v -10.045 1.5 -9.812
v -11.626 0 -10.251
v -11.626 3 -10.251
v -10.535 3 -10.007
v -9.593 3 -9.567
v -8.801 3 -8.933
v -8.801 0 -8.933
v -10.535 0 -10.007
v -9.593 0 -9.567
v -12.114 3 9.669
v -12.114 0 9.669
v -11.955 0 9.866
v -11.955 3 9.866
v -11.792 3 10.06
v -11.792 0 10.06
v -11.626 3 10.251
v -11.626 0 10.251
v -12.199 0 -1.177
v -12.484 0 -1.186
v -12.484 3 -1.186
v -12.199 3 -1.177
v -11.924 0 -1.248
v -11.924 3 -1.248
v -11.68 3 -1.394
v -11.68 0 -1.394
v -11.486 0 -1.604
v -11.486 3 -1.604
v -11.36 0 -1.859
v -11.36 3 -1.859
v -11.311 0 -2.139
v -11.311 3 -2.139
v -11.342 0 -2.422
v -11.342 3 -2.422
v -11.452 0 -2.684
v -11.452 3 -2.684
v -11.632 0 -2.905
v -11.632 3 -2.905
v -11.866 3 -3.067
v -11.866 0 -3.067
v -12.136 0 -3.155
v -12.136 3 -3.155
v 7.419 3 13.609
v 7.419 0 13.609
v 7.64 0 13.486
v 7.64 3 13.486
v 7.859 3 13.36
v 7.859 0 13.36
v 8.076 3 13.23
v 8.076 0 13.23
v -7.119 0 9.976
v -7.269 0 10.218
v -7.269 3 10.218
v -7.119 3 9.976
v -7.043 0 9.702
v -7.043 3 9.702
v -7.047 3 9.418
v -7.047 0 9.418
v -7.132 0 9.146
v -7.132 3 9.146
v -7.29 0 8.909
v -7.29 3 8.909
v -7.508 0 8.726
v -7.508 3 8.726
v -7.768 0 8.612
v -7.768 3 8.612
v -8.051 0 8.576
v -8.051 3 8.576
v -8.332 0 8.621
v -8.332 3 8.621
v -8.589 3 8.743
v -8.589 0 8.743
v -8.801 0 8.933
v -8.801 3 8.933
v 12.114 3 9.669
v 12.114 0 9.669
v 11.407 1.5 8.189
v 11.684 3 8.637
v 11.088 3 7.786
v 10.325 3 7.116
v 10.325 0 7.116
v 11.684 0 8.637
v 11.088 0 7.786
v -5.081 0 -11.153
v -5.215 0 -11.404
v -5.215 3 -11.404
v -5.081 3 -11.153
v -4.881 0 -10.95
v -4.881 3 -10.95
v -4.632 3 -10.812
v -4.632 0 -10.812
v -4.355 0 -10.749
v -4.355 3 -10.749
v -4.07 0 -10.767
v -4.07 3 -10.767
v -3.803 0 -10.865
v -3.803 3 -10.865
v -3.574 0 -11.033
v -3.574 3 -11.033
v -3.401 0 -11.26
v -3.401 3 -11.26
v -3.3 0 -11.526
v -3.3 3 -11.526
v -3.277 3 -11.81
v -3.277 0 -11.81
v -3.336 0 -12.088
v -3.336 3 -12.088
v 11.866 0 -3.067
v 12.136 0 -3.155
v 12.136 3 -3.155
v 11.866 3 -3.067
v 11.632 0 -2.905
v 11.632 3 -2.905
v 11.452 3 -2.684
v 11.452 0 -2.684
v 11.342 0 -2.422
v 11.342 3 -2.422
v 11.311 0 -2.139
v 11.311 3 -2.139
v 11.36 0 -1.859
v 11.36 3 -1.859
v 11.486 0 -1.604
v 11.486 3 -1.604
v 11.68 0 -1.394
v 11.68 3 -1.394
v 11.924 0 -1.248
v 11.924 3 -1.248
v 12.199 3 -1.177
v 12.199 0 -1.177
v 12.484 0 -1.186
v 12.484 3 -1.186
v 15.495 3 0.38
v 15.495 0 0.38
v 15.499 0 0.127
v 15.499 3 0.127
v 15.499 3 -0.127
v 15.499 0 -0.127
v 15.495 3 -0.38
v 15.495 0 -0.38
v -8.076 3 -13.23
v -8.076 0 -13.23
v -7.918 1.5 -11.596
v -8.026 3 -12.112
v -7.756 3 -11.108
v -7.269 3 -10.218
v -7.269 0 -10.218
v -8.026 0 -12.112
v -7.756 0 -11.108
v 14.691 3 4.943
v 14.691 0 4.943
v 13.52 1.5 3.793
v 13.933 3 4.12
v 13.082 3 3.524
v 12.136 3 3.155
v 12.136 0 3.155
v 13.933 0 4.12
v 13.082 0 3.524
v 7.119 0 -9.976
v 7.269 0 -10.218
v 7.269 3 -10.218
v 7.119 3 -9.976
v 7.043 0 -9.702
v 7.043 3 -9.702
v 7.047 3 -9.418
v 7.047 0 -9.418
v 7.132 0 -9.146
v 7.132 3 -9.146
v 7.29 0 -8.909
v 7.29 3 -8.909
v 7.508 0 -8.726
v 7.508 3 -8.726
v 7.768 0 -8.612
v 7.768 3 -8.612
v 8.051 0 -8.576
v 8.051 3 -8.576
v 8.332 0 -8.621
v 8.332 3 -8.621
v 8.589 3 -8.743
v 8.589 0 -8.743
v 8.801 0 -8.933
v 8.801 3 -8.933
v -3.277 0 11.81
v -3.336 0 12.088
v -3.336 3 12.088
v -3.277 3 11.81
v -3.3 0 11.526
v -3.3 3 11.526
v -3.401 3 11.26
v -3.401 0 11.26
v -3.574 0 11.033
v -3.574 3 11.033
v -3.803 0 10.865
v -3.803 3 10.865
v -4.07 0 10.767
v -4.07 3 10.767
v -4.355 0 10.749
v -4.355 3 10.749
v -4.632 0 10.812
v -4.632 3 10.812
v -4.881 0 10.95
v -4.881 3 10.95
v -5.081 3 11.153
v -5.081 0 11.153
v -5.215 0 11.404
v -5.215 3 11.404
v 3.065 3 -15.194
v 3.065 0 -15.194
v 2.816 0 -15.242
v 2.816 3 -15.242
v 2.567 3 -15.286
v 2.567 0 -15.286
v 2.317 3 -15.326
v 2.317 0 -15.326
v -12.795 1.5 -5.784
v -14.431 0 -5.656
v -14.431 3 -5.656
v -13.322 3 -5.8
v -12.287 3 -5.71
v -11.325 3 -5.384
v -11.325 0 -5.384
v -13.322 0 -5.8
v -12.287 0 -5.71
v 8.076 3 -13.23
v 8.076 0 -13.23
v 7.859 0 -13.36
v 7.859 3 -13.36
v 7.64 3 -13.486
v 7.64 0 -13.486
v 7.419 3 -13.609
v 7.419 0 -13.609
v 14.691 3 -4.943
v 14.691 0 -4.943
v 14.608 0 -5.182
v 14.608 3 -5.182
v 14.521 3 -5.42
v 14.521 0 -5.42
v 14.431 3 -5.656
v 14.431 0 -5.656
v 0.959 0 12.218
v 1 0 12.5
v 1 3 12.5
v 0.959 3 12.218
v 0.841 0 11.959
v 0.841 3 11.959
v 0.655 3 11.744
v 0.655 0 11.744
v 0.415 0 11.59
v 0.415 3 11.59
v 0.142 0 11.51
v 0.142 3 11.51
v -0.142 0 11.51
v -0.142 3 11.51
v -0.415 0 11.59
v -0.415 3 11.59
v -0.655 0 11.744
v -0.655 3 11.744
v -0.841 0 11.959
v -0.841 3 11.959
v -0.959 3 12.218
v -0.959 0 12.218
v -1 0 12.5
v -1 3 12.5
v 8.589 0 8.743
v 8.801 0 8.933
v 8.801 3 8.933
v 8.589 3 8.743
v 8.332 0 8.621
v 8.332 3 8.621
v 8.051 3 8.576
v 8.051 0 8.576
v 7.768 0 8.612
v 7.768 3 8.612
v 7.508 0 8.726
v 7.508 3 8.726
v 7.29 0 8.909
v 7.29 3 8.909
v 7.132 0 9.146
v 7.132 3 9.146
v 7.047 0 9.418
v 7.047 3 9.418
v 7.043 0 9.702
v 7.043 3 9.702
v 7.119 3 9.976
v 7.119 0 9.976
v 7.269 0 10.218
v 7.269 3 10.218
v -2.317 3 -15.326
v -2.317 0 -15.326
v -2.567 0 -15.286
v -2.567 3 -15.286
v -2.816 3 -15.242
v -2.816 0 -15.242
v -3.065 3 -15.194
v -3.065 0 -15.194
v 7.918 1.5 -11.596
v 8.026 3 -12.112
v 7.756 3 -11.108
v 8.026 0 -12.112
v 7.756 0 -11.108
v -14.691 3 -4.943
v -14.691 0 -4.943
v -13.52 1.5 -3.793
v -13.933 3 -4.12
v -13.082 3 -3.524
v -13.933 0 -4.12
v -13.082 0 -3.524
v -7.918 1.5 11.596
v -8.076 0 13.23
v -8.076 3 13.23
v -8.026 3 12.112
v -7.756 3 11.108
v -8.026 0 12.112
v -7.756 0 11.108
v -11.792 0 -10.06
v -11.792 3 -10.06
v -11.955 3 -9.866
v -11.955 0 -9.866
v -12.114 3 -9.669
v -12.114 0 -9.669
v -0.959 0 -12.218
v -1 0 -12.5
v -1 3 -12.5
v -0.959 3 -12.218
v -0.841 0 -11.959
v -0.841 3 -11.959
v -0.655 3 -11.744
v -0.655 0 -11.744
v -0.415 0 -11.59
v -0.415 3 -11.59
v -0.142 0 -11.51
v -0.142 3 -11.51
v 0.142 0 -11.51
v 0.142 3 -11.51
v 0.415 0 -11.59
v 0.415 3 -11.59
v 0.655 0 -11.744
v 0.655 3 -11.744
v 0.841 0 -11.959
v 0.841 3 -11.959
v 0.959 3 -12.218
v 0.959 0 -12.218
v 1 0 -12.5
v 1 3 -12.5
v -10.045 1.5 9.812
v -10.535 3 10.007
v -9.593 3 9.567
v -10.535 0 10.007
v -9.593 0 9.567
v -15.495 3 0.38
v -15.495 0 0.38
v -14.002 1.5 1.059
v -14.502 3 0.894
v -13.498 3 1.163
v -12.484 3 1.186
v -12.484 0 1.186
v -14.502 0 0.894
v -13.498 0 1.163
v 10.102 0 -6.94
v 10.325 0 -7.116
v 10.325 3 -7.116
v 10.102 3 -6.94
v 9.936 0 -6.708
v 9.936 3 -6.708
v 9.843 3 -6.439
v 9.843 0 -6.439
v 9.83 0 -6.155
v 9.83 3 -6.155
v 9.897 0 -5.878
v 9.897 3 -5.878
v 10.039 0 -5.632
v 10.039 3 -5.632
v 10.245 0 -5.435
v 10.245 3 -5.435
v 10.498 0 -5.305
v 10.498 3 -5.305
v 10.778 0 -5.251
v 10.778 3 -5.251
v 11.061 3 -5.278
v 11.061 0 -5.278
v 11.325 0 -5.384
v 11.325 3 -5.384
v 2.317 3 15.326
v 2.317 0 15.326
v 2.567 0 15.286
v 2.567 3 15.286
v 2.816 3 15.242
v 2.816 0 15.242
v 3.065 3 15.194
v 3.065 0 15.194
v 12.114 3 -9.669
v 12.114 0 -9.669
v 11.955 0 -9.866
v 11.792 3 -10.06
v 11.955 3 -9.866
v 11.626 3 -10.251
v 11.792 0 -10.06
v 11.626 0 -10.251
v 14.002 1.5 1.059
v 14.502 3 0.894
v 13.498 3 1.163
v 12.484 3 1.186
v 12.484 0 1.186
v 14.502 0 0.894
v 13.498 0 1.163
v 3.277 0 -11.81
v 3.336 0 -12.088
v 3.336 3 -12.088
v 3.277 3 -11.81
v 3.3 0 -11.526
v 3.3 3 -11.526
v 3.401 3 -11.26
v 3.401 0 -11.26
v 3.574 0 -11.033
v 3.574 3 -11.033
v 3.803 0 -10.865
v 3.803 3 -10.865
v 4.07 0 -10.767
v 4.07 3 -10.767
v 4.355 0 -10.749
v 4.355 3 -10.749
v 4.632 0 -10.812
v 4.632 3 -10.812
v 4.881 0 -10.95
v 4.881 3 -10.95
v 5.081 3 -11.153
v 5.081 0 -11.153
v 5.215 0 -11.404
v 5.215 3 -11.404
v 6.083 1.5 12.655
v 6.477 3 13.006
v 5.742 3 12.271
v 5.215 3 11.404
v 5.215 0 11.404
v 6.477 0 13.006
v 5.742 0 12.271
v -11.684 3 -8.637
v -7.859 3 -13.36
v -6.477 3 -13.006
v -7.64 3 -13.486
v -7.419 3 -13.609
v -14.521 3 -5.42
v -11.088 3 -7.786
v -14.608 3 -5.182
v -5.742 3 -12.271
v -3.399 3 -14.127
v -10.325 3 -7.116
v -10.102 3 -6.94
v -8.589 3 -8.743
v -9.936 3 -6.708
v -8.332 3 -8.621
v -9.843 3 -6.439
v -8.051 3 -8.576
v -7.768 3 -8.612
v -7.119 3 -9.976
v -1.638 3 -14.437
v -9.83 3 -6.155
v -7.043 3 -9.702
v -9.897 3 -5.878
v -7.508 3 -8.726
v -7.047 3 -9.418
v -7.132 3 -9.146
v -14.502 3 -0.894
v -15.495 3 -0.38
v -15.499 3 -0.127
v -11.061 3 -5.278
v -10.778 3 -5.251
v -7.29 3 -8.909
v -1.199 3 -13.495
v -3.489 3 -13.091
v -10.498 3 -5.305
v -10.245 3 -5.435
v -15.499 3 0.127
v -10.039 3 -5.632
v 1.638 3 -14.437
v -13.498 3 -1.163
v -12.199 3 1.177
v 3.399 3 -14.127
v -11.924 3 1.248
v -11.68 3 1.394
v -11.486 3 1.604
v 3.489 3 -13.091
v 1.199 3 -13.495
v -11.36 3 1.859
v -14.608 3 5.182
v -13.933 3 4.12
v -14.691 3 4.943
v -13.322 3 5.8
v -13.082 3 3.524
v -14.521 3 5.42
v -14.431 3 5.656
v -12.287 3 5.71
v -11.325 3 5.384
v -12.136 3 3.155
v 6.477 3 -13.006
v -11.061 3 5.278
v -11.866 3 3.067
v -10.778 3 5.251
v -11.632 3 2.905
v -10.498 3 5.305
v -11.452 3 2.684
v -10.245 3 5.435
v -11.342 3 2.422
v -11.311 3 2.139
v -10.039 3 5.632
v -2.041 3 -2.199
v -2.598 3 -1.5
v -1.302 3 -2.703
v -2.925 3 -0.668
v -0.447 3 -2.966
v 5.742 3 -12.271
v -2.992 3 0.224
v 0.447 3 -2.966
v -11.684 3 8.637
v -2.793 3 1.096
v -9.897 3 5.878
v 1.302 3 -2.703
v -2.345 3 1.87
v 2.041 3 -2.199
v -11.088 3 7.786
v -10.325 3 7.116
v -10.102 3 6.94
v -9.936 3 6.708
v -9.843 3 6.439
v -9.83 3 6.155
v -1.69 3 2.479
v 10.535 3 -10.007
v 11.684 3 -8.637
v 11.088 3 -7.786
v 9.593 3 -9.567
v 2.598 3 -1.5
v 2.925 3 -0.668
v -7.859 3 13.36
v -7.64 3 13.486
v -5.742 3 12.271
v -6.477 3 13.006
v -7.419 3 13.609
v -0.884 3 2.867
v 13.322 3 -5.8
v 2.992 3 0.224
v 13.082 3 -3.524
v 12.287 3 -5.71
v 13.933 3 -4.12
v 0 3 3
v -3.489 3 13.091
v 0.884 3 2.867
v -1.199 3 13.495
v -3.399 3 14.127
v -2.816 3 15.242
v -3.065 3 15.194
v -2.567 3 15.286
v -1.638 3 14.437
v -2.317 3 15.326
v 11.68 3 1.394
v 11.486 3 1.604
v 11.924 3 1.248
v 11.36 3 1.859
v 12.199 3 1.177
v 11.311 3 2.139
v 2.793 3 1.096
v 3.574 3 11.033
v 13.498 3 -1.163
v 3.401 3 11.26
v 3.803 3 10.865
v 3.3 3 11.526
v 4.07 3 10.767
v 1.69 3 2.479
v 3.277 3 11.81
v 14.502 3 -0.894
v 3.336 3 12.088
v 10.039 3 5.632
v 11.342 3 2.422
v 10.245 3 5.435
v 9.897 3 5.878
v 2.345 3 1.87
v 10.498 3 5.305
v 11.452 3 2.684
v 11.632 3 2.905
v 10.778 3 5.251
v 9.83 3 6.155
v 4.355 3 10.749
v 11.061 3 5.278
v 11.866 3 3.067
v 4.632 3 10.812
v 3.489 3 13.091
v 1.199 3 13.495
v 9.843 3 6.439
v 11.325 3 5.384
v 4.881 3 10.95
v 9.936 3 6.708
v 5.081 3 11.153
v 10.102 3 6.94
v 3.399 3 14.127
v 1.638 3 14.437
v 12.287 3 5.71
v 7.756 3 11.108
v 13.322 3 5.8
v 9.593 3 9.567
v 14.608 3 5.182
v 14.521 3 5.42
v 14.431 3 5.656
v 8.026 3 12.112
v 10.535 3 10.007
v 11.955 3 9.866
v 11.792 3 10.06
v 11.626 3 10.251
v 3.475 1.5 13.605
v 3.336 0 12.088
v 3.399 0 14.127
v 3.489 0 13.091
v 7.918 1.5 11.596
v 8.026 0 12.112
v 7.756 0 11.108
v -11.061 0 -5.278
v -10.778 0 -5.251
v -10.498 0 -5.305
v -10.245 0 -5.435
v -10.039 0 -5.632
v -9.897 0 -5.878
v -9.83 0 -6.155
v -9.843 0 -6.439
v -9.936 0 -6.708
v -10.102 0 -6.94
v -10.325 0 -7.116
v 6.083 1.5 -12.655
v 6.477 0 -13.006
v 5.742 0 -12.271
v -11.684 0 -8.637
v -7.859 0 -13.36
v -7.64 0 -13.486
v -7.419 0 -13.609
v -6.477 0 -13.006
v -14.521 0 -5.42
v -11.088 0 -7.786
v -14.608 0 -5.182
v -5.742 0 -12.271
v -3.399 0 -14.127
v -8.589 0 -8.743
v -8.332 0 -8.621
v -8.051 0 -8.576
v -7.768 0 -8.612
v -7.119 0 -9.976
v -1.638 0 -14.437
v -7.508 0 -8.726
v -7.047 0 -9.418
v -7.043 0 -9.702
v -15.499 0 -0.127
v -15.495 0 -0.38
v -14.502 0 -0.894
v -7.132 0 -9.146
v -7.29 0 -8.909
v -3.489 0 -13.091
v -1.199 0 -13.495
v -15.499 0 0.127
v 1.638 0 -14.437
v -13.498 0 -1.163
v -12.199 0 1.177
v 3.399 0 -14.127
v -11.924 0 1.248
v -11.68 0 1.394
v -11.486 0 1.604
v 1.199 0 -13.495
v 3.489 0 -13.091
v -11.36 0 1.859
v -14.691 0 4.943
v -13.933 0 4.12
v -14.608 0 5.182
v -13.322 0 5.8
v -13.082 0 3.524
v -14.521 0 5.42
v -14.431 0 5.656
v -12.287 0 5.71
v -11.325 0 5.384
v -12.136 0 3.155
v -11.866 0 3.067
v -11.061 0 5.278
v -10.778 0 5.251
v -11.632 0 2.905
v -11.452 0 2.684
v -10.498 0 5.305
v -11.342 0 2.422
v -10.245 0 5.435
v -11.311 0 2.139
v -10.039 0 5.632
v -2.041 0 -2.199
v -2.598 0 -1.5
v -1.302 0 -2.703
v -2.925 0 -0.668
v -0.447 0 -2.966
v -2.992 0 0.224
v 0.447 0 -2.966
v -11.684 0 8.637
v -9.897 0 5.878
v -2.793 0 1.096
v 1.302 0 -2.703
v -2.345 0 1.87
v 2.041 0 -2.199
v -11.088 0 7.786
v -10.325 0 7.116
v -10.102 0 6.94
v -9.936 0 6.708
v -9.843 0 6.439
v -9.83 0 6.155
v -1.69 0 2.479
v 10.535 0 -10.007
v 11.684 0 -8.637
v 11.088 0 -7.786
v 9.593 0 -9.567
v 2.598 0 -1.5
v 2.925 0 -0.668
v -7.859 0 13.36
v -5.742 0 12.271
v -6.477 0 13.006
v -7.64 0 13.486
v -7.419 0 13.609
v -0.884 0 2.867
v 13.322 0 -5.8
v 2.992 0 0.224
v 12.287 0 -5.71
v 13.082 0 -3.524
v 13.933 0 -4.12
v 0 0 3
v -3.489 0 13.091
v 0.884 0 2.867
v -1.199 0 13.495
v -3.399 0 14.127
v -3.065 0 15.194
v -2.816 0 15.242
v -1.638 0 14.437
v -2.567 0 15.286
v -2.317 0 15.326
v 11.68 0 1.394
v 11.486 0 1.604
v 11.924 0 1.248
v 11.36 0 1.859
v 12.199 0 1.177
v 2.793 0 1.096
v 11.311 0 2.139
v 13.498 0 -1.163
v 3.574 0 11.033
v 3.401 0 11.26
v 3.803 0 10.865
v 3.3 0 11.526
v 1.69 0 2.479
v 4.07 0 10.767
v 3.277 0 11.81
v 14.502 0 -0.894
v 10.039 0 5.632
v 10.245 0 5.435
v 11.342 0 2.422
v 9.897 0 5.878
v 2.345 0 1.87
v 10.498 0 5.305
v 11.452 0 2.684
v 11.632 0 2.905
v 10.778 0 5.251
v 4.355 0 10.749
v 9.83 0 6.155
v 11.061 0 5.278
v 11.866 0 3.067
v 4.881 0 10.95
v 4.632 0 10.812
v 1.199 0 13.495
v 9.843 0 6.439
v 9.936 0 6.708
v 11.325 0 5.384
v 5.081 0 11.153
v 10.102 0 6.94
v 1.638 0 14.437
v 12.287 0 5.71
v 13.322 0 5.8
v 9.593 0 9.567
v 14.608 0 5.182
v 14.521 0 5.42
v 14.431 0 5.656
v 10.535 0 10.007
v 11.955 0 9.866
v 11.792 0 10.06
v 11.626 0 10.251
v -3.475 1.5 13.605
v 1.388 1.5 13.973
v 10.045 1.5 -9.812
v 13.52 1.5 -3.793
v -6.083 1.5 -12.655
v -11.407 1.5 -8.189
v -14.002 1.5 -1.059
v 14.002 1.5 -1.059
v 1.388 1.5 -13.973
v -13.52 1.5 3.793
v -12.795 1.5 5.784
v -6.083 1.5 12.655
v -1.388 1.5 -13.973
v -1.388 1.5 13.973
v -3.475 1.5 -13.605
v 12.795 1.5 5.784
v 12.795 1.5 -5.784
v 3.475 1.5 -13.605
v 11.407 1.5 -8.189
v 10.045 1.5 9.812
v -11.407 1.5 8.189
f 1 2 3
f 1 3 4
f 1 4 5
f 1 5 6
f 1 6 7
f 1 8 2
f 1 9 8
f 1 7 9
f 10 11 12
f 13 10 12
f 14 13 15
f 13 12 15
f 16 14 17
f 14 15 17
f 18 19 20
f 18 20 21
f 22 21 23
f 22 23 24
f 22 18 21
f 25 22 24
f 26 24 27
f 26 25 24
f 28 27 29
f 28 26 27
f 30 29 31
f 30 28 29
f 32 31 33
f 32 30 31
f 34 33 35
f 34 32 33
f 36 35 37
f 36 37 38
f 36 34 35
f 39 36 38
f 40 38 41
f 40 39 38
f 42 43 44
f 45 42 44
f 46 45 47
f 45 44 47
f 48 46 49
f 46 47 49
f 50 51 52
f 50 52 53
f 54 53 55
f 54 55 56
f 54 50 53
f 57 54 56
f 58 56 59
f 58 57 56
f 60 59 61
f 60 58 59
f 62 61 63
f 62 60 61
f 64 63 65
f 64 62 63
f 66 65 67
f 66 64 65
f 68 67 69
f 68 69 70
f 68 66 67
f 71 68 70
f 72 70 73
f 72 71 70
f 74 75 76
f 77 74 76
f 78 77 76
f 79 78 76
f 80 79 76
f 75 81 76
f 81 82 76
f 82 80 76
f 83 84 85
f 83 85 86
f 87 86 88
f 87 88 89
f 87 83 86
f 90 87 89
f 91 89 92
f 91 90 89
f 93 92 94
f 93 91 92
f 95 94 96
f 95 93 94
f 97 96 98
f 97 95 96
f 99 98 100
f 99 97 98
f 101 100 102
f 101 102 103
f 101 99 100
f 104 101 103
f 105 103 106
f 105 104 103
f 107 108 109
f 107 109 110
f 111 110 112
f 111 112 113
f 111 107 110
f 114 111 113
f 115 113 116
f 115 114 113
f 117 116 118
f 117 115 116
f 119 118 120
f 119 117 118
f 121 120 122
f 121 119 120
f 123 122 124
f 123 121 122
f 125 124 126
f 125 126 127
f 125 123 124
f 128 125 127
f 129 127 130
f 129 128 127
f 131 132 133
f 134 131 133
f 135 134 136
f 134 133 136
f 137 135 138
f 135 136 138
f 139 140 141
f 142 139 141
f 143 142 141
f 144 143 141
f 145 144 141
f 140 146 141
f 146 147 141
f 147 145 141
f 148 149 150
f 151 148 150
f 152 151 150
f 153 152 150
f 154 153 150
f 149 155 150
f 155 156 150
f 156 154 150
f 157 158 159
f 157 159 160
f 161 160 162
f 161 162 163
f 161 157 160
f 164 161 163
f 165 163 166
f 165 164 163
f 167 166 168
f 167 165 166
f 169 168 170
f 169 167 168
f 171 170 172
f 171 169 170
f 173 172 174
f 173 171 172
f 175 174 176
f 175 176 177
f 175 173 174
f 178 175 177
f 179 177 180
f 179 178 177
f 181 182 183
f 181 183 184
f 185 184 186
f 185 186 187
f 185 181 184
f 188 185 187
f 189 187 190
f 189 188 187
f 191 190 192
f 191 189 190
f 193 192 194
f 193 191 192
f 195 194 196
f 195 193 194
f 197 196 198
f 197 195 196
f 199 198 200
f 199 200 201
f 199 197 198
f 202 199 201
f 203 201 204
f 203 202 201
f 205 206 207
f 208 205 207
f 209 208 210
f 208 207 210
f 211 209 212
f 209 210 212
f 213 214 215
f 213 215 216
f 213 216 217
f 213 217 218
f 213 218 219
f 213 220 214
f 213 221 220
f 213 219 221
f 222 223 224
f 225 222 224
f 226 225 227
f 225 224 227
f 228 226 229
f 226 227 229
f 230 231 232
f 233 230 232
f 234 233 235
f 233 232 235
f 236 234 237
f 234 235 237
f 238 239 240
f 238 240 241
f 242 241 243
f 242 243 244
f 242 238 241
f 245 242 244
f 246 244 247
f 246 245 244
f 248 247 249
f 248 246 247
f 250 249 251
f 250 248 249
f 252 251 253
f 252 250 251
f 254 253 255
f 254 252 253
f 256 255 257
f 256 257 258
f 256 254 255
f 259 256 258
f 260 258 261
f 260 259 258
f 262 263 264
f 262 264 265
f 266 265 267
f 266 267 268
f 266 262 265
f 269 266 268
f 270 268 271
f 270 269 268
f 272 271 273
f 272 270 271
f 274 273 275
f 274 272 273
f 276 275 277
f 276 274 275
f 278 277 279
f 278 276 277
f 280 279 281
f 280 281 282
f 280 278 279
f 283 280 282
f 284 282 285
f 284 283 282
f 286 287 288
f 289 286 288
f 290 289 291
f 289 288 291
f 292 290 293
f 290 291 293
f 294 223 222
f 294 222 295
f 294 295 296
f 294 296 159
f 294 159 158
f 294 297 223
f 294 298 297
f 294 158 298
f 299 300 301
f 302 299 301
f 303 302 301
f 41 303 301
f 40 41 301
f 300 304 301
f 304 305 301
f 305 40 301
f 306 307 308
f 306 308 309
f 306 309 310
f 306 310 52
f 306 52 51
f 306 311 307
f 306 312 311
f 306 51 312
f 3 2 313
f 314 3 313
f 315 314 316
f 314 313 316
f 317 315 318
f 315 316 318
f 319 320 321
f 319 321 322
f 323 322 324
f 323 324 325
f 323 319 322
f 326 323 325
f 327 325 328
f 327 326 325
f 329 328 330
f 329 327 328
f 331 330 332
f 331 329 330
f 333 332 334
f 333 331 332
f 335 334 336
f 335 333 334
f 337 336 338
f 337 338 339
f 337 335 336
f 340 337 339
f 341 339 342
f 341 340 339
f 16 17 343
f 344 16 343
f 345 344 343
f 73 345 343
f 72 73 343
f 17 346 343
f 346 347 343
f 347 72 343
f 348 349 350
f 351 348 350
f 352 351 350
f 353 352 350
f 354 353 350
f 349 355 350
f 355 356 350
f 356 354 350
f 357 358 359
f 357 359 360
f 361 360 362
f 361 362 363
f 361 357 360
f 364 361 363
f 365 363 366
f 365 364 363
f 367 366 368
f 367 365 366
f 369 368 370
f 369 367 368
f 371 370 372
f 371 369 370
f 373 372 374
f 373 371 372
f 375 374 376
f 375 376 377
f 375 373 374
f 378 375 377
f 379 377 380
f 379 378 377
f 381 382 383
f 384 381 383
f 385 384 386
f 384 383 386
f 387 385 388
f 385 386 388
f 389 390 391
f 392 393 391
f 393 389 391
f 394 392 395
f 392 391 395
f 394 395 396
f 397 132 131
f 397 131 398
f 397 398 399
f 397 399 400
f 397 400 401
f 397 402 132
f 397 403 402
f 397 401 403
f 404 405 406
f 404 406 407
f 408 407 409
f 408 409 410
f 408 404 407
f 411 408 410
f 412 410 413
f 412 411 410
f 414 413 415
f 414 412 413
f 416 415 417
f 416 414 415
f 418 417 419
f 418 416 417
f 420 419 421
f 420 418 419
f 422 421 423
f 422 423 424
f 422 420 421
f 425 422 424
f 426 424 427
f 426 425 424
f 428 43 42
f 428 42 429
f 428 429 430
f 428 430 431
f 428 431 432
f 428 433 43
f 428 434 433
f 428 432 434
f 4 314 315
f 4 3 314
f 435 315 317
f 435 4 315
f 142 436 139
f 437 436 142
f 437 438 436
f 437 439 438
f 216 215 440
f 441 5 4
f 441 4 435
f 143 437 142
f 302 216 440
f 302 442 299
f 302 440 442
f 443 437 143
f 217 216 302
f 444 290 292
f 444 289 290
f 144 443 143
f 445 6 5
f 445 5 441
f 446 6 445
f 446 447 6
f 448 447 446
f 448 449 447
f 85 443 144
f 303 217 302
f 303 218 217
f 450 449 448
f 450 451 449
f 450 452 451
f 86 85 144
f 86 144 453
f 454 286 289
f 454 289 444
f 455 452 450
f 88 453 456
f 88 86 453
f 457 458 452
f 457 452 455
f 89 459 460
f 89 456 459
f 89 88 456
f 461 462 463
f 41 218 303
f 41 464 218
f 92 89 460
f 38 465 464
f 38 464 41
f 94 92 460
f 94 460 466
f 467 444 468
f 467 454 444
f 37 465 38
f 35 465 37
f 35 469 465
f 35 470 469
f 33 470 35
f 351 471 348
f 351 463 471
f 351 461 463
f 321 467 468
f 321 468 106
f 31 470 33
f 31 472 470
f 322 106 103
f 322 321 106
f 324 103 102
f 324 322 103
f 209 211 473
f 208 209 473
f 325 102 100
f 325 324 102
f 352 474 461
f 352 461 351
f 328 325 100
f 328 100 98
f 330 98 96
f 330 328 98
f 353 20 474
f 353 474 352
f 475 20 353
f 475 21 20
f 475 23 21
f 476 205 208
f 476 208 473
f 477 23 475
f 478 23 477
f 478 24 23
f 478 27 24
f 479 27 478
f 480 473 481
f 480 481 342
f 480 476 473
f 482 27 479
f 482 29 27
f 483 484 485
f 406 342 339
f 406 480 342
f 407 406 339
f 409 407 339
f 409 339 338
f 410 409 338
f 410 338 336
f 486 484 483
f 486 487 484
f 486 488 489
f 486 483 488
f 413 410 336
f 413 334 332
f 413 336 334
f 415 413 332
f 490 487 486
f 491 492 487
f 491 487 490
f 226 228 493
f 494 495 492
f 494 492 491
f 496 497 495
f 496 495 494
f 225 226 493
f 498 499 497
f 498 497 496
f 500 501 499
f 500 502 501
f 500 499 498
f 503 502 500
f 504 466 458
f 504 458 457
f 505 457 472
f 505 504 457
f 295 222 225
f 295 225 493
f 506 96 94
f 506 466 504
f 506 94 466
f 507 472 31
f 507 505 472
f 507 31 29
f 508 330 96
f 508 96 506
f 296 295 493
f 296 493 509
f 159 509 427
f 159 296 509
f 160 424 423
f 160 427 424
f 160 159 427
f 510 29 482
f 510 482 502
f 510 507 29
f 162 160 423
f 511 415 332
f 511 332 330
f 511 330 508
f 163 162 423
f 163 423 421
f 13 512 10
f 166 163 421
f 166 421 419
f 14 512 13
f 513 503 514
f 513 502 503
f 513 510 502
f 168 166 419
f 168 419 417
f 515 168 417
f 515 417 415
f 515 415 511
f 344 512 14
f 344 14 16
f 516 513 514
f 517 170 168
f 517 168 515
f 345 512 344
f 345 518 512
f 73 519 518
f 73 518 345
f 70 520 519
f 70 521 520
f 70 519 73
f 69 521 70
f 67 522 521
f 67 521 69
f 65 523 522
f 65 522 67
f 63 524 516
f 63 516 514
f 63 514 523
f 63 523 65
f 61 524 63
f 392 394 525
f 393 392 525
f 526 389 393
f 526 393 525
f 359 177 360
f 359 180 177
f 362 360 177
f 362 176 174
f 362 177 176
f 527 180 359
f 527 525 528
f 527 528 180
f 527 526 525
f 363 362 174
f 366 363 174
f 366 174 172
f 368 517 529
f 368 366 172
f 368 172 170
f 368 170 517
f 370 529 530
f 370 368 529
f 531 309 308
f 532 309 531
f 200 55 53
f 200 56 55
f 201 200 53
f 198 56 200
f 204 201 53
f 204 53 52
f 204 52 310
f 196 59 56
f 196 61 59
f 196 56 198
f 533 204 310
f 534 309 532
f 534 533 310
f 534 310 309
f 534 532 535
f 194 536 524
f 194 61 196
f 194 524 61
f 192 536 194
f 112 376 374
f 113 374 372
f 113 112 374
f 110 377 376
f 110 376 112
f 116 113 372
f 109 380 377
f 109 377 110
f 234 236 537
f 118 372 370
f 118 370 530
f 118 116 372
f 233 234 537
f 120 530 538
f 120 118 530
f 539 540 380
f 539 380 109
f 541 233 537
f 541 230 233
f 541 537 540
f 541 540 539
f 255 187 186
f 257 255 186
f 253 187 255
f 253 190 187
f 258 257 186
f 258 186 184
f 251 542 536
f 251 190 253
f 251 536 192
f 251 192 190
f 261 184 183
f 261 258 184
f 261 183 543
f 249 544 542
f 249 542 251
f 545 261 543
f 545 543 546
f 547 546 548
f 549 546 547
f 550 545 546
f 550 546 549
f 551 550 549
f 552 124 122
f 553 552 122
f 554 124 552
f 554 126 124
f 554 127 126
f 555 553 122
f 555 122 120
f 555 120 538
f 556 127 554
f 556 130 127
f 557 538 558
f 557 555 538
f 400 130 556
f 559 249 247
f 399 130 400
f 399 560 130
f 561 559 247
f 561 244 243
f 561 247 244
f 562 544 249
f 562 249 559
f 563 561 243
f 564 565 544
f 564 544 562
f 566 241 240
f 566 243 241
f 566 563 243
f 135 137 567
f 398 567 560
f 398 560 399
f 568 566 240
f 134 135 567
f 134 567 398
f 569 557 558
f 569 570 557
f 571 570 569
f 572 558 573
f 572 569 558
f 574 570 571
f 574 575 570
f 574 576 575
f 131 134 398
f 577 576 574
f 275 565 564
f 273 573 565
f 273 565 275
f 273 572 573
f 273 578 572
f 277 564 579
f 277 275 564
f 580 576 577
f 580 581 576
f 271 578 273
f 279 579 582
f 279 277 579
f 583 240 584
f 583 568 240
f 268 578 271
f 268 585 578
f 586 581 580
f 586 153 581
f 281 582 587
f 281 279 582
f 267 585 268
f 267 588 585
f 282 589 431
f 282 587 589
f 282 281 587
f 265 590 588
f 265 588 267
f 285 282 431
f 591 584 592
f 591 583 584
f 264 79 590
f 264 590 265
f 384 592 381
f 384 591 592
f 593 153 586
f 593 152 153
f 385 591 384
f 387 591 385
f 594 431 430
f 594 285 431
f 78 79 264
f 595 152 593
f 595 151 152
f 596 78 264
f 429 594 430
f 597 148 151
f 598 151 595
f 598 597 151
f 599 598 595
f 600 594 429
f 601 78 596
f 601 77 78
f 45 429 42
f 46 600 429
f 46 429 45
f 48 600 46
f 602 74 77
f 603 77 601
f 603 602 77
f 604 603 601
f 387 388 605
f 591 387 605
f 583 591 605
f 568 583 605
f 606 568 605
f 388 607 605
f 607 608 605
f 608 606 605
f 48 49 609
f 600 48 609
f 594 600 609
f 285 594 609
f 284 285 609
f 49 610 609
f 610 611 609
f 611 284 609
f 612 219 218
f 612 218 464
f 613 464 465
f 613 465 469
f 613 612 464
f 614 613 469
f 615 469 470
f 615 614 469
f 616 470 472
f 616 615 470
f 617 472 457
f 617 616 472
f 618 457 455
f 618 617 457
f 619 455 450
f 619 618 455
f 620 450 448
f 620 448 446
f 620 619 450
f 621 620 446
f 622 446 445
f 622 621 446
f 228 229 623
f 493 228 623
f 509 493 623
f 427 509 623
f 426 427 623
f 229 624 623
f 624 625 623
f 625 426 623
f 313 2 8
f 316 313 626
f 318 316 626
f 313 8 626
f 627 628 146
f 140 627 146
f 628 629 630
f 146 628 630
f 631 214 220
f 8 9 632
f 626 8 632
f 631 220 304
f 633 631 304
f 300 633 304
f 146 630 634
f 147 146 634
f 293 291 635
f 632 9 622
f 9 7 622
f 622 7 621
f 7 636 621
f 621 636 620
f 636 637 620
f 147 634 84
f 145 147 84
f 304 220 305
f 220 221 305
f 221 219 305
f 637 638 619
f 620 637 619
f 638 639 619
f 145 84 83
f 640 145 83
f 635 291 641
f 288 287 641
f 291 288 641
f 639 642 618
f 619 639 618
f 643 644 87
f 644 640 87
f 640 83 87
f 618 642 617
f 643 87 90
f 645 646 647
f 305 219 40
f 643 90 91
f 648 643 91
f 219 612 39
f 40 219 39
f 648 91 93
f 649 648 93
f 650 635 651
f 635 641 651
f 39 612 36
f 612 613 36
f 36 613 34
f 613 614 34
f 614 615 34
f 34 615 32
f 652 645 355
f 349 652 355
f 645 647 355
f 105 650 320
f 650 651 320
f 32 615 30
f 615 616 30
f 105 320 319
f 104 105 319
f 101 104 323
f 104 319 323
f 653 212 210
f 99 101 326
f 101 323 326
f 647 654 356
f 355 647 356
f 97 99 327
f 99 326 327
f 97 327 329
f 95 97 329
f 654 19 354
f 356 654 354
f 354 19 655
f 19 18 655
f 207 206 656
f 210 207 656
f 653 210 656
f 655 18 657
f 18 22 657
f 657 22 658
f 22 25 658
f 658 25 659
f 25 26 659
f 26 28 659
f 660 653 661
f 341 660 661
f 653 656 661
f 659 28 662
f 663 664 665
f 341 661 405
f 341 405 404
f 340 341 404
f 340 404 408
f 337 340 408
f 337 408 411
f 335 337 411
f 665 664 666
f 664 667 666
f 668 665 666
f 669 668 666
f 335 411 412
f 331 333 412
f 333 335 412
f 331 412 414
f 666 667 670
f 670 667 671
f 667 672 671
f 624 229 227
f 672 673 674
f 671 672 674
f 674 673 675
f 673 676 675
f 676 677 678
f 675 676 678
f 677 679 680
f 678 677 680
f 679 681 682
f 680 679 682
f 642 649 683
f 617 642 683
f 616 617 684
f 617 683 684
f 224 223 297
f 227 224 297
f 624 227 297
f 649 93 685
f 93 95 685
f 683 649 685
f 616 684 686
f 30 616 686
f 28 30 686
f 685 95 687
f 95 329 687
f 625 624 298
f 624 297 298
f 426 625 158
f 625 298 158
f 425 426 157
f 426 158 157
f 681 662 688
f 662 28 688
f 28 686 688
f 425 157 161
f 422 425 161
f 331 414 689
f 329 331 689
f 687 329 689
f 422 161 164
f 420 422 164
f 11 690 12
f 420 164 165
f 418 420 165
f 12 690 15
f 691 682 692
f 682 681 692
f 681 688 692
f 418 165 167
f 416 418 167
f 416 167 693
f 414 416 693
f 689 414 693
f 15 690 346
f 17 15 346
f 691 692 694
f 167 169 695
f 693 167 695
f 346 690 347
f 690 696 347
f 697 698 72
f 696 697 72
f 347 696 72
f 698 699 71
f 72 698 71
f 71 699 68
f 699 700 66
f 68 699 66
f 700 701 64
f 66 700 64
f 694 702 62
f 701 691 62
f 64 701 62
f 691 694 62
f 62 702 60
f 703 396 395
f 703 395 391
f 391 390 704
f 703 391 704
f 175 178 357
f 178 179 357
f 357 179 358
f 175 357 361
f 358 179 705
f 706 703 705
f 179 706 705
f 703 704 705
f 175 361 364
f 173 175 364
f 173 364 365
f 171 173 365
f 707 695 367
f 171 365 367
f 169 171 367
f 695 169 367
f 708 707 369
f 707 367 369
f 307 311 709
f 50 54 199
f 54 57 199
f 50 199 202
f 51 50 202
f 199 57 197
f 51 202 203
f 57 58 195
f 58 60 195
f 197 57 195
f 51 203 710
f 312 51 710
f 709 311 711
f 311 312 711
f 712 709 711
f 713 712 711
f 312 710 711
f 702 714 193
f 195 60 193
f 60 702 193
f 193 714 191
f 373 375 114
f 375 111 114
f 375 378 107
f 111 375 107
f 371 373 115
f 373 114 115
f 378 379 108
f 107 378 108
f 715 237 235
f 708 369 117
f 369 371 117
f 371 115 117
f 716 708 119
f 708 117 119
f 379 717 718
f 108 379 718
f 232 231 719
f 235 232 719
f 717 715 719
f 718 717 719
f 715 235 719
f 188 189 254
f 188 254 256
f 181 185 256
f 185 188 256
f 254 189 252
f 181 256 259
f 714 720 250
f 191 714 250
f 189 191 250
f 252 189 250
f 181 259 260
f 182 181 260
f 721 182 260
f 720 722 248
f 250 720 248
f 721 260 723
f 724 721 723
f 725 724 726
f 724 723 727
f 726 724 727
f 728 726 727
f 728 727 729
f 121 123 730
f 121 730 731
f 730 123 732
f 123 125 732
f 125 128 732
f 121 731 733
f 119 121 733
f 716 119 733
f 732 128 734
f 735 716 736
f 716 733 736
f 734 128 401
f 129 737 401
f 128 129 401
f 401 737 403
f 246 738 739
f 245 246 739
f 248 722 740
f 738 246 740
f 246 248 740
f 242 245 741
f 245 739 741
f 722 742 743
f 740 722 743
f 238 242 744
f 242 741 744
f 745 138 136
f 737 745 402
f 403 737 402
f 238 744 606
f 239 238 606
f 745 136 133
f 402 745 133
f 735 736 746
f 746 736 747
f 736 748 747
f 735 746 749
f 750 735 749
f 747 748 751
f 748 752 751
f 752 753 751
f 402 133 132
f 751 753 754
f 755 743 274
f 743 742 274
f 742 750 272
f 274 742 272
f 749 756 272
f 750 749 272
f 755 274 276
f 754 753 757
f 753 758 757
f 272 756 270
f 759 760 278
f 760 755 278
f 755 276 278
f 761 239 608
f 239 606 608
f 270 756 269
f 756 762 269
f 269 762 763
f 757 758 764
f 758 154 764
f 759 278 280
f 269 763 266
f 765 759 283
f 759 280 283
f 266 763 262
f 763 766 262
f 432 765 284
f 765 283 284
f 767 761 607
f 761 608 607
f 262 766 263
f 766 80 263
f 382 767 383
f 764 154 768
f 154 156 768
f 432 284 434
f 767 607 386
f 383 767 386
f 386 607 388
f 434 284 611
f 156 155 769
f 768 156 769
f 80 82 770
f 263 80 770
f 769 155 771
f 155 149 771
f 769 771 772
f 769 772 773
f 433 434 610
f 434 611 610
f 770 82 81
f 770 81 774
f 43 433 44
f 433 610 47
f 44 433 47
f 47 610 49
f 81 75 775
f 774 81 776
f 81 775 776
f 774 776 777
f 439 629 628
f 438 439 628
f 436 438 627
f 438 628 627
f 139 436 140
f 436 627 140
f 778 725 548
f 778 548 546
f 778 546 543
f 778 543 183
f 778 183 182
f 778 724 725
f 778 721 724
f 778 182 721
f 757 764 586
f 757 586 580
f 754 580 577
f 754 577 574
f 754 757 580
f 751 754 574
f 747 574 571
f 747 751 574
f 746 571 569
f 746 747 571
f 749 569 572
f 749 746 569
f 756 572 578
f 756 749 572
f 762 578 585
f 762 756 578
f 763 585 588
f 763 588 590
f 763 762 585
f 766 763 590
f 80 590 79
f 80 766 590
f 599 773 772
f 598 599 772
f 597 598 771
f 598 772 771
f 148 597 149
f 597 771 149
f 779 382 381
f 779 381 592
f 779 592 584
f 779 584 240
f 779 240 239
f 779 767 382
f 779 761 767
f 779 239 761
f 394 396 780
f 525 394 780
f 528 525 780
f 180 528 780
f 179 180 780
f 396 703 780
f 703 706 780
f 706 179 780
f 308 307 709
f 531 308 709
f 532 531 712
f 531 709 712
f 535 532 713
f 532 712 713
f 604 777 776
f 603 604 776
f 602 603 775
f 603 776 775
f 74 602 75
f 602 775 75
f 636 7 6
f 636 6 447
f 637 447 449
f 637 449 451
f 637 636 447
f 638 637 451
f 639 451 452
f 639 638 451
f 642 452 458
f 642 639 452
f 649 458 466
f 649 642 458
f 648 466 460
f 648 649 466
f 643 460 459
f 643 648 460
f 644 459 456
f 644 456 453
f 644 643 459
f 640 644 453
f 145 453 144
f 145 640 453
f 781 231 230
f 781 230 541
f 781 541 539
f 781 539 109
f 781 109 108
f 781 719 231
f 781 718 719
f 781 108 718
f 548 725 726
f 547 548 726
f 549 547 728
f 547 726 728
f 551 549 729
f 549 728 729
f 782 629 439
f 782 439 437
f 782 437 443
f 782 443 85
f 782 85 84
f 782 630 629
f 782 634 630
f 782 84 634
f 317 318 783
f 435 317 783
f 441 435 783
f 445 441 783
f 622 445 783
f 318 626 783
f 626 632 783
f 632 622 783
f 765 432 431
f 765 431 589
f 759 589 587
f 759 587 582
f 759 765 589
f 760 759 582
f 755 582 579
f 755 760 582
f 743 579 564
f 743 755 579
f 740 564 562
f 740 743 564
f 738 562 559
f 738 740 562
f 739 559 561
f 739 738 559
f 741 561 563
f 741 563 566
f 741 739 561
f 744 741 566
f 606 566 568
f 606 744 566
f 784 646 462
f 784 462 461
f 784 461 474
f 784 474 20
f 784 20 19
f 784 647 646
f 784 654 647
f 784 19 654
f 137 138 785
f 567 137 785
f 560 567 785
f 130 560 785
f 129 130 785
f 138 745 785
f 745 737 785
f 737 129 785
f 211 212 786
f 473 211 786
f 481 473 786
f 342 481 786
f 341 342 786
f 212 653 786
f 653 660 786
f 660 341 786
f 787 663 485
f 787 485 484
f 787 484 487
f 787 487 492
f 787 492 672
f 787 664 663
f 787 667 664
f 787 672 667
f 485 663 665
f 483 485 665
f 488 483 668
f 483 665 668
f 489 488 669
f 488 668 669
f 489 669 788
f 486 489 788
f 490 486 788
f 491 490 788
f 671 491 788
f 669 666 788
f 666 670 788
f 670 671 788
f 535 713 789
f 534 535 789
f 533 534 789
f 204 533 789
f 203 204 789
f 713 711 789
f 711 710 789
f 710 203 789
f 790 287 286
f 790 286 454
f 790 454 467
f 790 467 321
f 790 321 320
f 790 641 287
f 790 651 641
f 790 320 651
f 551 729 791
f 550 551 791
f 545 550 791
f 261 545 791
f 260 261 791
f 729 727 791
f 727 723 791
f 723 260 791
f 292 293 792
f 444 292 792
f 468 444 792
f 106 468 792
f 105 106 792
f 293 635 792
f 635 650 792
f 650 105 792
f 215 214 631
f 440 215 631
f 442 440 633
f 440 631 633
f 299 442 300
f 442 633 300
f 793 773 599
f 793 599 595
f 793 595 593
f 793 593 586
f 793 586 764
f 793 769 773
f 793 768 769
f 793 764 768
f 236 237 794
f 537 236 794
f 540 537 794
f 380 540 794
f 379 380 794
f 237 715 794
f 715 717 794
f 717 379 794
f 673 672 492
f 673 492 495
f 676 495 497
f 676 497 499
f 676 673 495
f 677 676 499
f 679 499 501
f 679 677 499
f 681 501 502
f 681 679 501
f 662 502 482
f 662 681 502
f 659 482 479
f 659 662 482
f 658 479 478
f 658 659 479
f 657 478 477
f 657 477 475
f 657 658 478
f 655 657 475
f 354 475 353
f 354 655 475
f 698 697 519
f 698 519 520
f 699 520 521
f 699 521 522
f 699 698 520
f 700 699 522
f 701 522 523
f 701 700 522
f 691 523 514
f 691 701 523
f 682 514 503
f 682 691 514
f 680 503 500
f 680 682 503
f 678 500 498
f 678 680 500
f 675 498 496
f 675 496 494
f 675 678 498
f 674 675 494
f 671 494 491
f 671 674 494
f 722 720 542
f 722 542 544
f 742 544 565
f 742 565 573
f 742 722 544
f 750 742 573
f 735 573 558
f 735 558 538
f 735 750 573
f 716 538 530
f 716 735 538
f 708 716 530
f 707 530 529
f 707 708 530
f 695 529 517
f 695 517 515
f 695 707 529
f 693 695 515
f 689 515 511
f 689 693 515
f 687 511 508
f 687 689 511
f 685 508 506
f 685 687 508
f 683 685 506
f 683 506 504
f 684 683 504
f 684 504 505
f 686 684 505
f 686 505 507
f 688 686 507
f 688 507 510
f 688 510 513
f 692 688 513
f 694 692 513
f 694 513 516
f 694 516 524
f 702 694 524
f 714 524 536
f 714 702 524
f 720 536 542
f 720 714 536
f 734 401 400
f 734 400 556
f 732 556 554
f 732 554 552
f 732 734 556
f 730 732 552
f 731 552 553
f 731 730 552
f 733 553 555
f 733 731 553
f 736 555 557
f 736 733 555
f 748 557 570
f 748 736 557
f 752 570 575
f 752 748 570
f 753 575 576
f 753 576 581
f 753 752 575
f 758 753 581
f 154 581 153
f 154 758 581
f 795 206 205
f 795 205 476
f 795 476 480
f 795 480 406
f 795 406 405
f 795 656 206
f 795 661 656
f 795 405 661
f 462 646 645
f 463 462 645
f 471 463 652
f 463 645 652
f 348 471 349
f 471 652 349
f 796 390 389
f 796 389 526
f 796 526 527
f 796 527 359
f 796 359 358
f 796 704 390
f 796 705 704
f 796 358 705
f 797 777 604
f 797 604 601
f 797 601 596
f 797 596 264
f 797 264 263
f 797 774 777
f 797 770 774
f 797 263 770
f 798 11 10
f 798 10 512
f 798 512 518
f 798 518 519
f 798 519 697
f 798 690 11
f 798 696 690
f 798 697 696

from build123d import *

# Parameters (mm, degrees)
SKETCH1_R           = 15.5
SKETCH1_R_2         = 3
BOSS_EXTRUDE1_DEPTH = 3
CUT_EXTRUDE3_START  = -3
CUT_EXTRUDE3_DEPTH  = 3
CIRPATTERN2_COUNT   = 18


with BuildPart() as part:
    # Sketch1 → Boss-Extrude1 (new body)
    with BuildSketch(Plane(origin=(0, 0, 0), x_dir=(1, 0, 0), z_dir=(0, 1, 0))):
        with Locations(Location((0, 0, 0), (0, 0, 270))):
            Circle(SKETCH1_R)
        with Locations(Location((0, 0, 0), (0, 0, 270))):
            Circle(SKETCH1_R_2, mode=Mode.SUBTRACT)
    extrude(amount=BOSS_EXTRUDE1_DEPTH)

    # Sketch3 → Cut-Extrude3 (cut)
    with BuildSketch(Plane(origin=(0, 3, 0), x_dir=(1, 0, 0), z_dir=(0, 1, 0)).offset(CUT_EXTRUDE3_START)):
        with BuildLine():
            ThreePointArc((-1, 12.5), (0, 11.5), (1, 12.5))
            add(Edge.make_bspline(
                [(2.316977637, 15.325847925), (1.117647531, 14.032764815), (1, 12.5)],
                knots=[0, 0, 0, 0.821337086, 0.821337086, 0.821337086], degree=2))
            ThreePointArc((2.316977637, 15.325847925), (0, 15.5), (-2.316977637, 15.325847925))
            add(Edge.make_bspline(
                [(-2.316977637, 15.325847925), (-1.117647531, 14.032764815), (-1, 12.5)],
                knots=[0, 0, 0, 0.821337086, 0.821337086, 0.821337086], degree=2))
        make_face()
    cut_extrude3 = extrude(amount=CUT_EXTRUDE3_DEPTH, mode=Mode.SUBTRACT)

    # CirPattern2: Cut-Extrude3 ×18 about axis
    cirpattern2_axis = Axis((0, 3, 0), (0, 1, 0))
    for i in range(1, CIRPATTERN2_COUNT):
        add(cut_extrude3.rotate(cirpattern2_axis, i * 360 / CIRPATTERN2_COUNT), mode=Mode.SUBTRACT)


solid = part.part
